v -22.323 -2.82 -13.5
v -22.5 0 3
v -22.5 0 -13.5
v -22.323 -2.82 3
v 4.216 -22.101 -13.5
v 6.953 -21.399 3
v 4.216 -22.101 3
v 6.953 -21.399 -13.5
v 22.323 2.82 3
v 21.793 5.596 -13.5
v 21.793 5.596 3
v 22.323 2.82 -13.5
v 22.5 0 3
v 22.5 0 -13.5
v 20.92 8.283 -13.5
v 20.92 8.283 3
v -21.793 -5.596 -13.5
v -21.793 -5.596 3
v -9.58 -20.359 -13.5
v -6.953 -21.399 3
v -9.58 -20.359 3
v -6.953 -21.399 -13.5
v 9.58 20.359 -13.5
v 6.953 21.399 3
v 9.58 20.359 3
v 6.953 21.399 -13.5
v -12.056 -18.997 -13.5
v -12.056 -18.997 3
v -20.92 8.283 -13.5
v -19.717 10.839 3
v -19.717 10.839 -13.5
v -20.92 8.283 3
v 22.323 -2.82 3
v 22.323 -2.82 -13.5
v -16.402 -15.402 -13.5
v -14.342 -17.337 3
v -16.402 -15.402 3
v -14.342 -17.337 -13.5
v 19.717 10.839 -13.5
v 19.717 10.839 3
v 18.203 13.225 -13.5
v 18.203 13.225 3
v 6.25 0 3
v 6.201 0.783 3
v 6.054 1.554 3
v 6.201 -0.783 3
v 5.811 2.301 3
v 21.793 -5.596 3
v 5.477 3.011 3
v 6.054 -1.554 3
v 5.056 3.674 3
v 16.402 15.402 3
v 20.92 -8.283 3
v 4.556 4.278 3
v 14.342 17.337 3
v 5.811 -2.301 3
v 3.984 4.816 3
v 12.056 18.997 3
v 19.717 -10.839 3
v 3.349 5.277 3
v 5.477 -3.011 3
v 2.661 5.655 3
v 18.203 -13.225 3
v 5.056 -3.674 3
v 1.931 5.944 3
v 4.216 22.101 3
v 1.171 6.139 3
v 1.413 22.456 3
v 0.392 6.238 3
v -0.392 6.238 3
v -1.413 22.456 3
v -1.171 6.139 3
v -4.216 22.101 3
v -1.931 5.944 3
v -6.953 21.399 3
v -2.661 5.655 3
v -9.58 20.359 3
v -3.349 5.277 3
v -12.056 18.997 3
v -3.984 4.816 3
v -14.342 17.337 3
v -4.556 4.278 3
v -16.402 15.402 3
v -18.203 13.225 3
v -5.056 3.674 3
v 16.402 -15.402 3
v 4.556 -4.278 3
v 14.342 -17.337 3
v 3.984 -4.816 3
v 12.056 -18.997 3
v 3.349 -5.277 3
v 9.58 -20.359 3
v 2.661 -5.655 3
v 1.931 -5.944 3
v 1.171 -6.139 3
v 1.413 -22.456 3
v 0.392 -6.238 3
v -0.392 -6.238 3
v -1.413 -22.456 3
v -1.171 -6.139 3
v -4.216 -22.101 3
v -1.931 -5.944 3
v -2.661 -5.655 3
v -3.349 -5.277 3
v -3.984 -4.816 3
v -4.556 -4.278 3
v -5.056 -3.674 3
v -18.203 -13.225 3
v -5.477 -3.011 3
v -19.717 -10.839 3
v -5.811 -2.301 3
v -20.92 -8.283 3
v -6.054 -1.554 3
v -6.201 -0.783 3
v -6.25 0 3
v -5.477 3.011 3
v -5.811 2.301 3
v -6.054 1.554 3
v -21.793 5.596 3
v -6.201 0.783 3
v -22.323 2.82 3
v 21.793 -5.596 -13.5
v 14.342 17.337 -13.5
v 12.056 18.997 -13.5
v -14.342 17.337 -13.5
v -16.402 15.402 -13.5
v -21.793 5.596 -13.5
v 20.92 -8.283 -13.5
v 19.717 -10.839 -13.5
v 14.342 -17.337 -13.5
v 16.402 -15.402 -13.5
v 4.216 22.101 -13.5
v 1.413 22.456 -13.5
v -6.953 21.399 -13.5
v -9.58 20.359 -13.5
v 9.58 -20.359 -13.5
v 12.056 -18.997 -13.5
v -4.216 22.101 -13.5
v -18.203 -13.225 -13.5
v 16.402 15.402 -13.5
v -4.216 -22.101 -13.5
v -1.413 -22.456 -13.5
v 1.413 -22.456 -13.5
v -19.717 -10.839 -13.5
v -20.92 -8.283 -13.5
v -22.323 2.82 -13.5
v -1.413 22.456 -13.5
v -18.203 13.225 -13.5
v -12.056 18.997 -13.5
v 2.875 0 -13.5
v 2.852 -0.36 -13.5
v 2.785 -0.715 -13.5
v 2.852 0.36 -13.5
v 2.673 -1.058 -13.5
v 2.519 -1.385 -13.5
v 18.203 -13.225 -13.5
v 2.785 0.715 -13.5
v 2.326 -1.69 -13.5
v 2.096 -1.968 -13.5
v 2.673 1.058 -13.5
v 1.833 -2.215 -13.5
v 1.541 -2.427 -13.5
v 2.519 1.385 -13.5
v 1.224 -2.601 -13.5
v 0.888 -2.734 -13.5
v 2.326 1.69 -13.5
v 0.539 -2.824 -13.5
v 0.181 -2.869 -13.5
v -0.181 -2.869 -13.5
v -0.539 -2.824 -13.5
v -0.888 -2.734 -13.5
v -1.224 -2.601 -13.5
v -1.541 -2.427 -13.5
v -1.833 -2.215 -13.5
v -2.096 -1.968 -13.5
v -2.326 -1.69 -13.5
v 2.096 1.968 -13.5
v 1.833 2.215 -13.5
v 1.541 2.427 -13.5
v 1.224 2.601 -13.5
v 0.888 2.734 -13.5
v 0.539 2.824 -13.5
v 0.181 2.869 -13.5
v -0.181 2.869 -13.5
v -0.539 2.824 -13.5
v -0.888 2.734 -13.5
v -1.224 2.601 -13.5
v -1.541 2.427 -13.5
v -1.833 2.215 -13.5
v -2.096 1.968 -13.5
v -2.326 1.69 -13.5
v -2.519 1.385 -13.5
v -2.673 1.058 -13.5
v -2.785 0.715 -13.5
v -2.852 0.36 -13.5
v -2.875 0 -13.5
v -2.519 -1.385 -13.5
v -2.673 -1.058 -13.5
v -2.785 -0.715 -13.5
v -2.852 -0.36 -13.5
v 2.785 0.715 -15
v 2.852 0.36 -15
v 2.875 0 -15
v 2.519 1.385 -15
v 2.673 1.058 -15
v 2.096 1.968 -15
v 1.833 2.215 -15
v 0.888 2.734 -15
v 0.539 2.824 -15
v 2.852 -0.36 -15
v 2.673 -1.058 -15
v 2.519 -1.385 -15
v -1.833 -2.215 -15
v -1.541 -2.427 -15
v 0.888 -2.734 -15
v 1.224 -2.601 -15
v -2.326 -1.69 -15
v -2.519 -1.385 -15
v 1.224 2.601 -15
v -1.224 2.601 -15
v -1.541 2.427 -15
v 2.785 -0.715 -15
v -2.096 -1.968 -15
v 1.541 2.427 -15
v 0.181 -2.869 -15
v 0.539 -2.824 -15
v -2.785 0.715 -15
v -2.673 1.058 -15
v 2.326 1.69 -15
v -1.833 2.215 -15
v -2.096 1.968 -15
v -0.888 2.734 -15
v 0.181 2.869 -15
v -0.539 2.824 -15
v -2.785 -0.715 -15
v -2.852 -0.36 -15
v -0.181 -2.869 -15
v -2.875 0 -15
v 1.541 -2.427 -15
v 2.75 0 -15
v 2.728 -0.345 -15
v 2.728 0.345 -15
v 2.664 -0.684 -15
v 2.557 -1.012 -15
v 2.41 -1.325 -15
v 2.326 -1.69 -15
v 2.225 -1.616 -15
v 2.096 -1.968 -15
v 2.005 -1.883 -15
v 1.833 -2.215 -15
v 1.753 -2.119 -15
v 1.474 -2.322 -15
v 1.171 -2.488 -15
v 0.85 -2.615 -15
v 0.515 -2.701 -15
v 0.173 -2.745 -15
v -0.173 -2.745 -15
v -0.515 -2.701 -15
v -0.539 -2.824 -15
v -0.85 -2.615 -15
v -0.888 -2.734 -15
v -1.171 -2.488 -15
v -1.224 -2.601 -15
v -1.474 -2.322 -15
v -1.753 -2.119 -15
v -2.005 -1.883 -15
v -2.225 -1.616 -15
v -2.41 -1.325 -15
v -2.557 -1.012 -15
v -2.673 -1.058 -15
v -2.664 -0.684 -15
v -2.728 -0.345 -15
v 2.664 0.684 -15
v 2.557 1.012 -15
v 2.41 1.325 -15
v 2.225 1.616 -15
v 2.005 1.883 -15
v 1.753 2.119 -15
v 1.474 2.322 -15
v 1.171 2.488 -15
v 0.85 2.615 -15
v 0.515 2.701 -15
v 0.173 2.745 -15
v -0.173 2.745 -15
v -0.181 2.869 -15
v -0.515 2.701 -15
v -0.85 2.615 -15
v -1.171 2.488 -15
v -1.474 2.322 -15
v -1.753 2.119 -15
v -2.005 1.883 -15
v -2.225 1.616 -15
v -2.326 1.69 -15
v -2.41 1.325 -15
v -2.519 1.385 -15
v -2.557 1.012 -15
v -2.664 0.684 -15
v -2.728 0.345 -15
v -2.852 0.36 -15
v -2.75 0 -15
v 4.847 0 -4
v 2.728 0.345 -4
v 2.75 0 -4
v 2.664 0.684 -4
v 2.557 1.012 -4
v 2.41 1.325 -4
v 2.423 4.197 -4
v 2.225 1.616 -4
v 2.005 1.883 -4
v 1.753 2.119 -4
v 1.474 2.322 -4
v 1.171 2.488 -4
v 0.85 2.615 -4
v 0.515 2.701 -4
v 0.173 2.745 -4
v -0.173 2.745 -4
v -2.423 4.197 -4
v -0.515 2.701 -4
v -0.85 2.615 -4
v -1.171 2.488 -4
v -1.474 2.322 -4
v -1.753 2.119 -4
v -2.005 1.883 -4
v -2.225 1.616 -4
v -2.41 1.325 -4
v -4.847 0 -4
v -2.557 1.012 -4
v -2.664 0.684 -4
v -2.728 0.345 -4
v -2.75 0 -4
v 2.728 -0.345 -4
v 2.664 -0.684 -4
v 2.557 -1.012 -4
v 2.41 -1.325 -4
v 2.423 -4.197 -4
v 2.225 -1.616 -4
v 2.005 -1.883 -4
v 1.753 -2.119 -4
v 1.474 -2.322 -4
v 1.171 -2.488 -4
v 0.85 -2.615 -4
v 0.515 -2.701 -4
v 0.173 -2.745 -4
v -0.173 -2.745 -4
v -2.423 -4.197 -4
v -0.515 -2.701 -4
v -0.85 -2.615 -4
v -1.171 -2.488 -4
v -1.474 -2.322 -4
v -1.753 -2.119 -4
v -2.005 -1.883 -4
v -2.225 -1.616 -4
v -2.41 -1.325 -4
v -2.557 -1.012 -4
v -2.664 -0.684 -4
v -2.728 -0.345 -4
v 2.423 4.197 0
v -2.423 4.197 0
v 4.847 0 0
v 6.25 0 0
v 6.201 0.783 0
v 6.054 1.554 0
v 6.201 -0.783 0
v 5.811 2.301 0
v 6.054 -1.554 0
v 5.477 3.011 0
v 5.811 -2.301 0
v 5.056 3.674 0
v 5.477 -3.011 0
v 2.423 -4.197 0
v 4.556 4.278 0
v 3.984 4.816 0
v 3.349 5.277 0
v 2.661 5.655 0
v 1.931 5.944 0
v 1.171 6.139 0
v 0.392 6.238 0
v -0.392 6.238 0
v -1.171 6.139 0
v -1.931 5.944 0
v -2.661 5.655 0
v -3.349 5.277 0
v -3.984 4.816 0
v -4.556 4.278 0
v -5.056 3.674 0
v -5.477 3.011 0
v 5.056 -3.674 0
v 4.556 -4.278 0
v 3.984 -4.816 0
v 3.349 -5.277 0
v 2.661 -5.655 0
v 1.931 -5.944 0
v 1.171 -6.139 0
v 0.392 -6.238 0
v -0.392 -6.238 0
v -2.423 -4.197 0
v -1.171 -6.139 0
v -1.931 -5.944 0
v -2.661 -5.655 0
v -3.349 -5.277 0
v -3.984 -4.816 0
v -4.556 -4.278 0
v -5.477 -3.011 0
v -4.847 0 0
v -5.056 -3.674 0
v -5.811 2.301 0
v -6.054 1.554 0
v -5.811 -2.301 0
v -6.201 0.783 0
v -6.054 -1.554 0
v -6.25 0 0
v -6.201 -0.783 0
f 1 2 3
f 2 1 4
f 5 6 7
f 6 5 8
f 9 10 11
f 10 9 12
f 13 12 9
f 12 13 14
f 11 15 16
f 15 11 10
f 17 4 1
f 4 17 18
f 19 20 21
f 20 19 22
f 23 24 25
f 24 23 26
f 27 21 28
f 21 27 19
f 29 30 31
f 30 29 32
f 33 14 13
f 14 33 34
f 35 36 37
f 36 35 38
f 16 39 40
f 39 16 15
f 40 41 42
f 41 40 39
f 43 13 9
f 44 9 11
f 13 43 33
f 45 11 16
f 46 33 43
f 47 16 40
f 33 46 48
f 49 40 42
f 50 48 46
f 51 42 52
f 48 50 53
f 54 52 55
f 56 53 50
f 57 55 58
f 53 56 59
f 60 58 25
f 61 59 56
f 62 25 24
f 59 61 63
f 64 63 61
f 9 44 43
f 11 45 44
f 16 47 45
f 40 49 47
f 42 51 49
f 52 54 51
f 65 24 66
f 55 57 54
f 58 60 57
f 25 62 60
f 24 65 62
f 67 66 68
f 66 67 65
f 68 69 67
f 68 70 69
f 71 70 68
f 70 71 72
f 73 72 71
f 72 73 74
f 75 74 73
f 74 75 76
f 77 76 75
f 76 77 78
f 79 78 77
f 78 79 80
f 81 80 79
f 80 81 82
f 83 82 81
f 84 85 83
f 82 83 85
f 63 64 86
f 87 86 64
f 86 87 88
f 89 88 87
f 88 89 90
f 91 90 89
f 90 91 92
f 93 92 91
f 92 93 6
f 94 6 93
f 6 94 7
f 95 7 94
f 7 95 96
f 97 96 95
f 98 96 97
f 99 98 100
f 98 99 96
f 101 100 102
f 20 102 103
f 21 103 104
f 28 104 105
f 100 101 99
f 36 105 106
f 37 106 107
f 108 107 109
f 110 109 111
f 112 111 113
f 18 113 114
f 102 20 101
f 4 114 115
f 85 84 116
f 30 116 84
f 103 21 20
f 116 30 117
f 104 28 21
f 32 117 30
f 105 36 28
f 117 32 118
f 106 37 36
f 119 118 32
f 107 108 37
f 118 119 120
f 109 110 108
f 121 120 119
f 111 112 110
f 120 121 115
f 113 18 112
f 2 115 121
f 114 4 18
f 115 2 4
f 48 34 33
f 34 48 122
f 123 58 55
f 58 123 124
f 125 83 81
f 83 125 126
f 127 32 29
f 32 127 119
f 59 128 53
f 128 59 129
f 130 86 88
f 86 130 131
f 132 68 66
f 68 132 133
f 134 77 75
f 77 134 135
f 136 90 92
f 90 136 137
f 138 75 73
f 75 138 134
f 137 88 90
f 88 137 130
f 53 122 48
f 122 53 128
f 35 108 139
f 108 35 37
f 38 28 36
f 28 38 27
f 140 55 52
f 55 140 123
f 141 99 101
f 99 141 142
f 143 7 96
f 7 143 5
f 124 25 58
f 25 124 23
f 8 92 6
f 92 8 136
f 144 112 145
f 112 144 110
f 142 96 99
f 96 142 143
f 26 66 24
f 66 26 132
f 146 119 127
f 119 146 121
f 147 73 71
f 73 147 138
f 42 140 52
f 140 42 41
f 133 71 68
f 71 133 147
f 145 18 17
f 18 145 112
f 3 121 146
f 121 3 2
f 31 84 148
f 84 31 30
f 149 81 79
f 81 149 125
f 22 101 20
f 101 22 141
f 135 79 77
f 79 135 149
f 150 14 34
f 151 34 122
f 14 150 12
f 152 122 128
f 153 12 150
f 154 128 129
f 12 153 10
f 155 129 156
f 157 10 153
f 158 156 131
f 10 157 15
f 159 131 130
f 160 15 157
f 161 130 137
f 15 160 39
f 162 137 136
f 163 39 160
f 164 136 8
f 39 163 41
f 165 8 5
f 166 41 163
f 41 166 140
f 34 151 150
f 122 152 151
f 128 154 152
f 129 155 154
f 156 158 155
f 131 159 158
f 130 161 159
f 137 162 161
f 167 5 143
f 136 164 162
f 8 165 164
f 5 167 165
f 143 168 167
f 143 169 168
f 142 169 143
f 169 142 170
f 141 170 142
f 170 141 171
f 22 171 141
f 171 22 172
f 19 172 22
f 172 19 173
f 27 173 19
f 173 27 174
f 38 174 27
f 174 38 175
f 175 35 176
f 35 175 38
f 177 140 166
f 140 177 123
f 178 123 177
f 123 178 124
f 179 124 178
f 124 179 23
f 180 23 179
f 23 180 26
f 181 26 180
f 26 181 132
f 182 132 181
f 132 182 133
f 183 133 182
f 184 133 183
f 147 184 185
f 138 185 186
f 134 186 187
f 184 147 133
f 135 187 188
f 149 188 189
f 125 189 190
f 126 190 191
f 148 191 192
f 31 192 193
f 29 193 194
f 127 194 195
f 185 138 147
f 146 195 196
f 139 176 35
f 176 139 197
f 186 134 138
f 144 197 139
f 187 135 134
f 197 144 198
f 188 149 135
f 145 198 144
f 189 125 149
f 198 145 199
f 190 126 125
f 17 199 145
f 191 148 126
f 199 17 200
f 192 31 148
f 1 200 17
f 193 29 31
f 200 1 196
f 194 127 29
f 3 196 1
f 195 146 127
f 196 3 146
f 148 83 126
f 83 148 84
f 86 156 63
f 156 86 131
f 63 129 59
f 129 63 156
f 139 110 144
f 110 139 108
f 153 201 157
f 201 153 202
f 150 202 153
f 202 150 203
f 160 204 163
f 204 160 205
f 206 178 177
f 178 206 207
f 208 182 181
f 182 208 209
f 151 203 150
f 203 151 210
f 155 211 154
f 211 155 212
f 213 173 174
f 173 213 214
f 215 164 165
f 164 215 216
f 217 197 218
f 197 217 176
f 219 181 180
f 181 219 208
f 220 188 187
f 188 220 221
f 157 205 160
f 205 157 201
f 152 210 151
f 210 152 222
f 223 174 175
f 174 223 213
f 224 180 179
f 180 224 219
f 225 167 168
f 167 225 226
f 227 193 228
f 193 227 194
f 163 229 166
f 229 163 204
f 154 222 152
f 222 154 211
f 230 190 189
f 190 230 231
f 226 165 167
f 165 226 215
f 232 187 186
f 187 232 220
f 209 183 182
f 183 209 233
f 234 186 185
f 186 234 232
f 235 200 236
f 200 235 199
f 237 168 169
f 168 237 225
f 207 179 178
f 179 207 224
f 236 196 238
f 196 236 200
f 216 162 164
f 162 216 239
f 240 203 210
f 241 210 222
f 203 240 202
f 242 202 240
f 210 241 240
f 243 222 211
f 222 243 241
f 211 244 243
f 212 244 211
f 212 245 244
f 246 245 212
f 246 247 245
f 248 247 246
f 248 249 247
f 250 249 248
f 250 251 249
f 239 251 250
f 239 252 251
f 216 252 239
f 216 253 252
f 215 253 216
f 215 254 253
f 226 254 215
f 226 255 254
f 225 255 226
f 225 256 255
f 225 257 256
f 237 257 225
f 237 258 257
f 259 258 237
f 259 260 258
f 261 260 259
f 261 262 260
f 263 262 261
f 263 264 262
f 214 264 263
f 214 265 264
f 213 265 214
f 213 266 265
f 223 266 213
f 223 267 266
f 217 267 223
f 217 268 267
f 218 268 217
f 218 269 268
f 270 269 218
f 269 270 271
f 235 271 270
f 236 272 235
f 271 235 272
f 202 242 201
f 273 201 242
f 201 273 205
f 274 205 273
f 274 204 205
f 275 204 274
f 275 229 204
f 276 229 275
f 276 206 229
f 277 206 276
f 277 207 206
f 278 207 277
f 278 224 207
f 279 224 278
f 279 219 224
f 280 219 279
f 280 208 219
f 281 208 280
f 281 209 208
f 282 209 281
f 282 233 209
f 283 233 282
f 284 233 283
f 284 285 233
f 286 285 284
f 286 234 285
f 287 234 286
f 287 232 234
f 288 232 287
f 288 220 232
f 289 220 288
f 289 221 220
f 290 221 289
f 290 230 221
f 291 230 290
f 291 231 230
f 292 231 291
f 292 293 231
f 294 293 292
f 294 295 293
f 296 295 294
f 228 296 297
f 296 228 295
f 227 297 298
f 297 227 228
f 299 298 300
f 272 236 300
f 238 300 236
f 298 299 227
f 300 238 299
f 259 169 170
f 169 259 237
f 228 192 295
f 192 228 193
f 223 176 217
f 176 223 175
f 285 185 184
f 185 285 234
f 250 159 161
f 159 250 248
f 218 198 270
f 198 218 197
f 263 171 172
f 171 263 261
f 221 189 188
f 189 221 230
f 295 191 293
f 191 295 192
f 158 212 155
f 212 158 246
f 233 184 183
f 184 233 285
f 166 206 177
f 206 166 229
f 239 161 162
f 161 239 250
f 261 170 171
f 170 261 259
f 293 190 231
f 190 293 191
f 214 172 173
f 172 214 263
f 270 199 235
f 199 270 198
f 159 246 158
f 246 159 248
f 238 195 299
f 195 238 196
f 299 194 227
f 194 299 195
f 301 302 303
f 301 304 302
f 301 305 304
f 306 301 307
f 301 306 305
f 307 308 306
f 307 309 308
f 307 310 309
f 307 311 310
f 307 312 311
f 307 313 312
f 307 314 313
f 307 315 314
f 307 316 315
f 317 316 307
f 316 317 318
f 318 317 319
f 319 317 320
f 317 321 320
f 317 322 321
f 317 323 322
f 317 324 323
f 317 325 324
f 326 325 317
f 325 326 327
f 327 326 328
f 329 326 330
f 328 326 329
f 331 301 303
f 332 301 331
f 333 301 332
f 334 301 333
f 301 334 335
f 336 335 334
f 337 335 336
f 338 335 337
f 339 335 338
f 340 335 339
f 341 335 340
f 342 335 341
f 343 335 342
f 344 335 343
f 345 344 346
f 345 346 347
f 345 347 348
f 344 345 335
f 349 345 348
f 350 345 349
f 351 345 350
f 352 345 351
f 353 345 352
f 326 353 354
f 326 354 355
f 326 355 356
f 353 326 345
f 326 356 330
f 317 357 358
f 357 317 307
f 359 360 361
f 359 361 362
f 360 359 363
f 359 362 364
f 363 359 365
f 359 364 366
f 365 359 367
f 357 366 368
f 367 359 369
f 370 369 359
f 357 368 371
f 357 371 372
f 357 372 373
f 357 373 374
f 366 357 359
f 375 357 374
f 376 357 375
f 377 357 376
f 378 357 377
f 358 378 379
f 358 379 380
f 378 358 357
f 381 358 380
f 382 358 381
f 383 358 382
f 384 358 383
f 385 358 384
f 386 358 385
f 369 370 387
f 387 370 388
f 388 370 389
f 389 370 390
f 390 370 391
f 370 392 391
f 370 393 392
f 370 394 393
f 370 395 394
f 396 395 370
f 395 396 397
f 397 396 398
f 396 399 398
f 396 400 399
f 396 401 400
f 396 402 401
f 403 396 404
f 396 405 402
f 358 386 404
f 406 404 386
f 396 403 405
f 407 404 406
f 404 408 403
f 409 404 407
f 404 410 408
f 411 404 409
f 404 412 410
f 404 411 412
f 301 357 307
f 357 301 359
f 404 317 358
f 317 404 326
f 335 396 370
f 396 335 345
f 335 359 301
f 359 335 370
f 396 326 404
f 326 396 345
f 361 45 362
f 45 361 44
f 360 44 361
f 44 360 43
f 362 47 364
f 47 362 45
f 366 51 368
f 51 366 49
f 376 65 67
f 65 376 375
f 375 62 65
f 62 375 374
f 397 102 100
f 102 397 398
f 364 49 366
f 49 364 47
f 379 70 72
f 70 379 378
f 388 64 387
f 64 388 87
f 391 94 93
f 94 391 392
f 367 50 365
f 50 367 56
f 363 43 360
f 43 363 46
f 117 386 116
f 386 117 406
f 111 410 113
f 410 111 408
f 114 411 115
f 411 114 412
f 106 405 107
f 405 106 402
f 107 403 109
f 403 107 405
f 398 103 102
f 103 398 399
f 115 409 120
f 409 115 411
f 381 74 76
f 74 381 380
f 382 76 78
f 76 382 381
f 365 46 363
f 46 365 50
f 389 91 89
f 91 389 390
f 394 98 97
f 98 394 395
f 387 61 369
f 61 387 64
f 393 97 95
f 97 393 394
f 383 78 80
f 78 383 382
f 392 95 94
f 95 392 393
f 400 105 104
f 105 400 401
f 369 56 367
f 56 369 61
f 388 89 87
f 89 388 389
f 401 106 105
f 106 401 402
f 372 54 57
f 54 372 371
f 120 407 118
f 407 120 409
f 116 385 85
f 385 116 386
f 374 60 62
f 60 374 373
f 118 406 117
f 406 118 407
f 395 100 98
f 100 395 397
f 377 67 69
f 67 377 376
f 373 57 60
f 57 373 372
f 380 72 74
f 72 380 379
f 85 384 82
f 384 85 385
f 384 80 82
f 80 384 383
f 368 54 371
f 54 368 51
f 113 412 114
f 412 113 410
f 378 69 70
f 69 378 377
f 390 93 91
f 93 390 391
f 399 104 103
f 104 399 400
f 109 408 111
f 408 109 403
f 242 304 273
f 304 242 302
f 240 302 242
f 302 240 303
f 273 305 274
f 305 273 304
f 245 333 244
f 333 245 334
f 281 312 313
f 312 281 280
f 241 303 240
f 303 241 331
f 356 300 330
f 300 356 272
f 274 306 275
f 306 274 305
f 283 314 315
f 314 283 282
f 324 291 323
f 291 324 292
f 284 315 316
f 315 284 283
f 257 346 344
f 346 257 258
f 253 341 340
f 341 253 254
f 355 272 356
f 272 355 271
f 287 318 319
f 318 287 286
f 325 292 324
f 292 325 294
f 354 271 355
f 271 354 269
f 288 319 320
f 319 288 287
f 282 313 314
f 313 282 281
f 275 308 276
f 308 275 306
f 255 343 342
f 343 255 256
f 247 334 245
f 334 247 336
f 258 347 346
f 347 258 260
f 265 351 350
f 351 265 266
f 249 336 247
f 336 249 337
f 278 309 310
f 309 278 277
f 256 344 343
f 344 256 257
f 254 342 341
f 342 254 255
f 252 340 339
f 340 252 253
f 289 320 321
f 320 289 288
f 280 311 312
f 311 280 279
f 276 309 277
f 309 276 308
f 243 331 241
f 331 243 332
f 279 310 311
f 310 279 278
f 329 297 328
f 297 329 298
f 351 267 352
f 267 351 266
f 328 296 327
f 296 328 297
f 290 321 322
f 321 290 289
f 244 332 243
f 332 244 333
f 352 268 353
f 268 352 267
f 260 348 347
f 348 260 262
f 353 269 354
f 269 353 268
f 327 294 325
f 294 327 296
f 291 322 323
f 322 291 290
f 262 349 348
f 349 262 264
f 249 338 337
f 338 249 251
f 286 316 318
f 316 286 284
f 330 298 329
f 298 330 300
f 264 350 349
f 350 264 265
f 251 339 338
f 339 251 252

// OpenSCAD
$fn = 50;


difference() {
	union() {
		translate(v = [0, 0, -13.5000000000]) {
			cylinder(h = 16.5000000000, r = 22.5000000000);
		}
		#translate(v = [0, 0, -15.0000000000]) {
			cylinder(h = 15, r = 2.8750000000);
		}
	}
	union() {
		translate(v = [0, 0, 0]) {
			rotate(a = [0, 0, 0]) {
				difference() {
					union() {
						translate(v = [0, 0, -4]) {
							linear_extrude(height = 4) {
								polygon(points = [[4.8468000000, 0.0000000000], [2.4234000000, 4.1974519271], [-2.4234000000, 4.1974519271], [-4.8468000000, 0.0000000000], [-2.4234000000, -4.1974519271], [2.4234000000, -4.1974519271]]);
							}
						}
					}
					union();
				}
			}
		}
		#cylinder(h = 3, r = 6.2500000000);
		#translate(v = [0, 0, -100.0000000000]) {
			cylinder(h = 200, r = 2.7500000000);
		}
	}
}
